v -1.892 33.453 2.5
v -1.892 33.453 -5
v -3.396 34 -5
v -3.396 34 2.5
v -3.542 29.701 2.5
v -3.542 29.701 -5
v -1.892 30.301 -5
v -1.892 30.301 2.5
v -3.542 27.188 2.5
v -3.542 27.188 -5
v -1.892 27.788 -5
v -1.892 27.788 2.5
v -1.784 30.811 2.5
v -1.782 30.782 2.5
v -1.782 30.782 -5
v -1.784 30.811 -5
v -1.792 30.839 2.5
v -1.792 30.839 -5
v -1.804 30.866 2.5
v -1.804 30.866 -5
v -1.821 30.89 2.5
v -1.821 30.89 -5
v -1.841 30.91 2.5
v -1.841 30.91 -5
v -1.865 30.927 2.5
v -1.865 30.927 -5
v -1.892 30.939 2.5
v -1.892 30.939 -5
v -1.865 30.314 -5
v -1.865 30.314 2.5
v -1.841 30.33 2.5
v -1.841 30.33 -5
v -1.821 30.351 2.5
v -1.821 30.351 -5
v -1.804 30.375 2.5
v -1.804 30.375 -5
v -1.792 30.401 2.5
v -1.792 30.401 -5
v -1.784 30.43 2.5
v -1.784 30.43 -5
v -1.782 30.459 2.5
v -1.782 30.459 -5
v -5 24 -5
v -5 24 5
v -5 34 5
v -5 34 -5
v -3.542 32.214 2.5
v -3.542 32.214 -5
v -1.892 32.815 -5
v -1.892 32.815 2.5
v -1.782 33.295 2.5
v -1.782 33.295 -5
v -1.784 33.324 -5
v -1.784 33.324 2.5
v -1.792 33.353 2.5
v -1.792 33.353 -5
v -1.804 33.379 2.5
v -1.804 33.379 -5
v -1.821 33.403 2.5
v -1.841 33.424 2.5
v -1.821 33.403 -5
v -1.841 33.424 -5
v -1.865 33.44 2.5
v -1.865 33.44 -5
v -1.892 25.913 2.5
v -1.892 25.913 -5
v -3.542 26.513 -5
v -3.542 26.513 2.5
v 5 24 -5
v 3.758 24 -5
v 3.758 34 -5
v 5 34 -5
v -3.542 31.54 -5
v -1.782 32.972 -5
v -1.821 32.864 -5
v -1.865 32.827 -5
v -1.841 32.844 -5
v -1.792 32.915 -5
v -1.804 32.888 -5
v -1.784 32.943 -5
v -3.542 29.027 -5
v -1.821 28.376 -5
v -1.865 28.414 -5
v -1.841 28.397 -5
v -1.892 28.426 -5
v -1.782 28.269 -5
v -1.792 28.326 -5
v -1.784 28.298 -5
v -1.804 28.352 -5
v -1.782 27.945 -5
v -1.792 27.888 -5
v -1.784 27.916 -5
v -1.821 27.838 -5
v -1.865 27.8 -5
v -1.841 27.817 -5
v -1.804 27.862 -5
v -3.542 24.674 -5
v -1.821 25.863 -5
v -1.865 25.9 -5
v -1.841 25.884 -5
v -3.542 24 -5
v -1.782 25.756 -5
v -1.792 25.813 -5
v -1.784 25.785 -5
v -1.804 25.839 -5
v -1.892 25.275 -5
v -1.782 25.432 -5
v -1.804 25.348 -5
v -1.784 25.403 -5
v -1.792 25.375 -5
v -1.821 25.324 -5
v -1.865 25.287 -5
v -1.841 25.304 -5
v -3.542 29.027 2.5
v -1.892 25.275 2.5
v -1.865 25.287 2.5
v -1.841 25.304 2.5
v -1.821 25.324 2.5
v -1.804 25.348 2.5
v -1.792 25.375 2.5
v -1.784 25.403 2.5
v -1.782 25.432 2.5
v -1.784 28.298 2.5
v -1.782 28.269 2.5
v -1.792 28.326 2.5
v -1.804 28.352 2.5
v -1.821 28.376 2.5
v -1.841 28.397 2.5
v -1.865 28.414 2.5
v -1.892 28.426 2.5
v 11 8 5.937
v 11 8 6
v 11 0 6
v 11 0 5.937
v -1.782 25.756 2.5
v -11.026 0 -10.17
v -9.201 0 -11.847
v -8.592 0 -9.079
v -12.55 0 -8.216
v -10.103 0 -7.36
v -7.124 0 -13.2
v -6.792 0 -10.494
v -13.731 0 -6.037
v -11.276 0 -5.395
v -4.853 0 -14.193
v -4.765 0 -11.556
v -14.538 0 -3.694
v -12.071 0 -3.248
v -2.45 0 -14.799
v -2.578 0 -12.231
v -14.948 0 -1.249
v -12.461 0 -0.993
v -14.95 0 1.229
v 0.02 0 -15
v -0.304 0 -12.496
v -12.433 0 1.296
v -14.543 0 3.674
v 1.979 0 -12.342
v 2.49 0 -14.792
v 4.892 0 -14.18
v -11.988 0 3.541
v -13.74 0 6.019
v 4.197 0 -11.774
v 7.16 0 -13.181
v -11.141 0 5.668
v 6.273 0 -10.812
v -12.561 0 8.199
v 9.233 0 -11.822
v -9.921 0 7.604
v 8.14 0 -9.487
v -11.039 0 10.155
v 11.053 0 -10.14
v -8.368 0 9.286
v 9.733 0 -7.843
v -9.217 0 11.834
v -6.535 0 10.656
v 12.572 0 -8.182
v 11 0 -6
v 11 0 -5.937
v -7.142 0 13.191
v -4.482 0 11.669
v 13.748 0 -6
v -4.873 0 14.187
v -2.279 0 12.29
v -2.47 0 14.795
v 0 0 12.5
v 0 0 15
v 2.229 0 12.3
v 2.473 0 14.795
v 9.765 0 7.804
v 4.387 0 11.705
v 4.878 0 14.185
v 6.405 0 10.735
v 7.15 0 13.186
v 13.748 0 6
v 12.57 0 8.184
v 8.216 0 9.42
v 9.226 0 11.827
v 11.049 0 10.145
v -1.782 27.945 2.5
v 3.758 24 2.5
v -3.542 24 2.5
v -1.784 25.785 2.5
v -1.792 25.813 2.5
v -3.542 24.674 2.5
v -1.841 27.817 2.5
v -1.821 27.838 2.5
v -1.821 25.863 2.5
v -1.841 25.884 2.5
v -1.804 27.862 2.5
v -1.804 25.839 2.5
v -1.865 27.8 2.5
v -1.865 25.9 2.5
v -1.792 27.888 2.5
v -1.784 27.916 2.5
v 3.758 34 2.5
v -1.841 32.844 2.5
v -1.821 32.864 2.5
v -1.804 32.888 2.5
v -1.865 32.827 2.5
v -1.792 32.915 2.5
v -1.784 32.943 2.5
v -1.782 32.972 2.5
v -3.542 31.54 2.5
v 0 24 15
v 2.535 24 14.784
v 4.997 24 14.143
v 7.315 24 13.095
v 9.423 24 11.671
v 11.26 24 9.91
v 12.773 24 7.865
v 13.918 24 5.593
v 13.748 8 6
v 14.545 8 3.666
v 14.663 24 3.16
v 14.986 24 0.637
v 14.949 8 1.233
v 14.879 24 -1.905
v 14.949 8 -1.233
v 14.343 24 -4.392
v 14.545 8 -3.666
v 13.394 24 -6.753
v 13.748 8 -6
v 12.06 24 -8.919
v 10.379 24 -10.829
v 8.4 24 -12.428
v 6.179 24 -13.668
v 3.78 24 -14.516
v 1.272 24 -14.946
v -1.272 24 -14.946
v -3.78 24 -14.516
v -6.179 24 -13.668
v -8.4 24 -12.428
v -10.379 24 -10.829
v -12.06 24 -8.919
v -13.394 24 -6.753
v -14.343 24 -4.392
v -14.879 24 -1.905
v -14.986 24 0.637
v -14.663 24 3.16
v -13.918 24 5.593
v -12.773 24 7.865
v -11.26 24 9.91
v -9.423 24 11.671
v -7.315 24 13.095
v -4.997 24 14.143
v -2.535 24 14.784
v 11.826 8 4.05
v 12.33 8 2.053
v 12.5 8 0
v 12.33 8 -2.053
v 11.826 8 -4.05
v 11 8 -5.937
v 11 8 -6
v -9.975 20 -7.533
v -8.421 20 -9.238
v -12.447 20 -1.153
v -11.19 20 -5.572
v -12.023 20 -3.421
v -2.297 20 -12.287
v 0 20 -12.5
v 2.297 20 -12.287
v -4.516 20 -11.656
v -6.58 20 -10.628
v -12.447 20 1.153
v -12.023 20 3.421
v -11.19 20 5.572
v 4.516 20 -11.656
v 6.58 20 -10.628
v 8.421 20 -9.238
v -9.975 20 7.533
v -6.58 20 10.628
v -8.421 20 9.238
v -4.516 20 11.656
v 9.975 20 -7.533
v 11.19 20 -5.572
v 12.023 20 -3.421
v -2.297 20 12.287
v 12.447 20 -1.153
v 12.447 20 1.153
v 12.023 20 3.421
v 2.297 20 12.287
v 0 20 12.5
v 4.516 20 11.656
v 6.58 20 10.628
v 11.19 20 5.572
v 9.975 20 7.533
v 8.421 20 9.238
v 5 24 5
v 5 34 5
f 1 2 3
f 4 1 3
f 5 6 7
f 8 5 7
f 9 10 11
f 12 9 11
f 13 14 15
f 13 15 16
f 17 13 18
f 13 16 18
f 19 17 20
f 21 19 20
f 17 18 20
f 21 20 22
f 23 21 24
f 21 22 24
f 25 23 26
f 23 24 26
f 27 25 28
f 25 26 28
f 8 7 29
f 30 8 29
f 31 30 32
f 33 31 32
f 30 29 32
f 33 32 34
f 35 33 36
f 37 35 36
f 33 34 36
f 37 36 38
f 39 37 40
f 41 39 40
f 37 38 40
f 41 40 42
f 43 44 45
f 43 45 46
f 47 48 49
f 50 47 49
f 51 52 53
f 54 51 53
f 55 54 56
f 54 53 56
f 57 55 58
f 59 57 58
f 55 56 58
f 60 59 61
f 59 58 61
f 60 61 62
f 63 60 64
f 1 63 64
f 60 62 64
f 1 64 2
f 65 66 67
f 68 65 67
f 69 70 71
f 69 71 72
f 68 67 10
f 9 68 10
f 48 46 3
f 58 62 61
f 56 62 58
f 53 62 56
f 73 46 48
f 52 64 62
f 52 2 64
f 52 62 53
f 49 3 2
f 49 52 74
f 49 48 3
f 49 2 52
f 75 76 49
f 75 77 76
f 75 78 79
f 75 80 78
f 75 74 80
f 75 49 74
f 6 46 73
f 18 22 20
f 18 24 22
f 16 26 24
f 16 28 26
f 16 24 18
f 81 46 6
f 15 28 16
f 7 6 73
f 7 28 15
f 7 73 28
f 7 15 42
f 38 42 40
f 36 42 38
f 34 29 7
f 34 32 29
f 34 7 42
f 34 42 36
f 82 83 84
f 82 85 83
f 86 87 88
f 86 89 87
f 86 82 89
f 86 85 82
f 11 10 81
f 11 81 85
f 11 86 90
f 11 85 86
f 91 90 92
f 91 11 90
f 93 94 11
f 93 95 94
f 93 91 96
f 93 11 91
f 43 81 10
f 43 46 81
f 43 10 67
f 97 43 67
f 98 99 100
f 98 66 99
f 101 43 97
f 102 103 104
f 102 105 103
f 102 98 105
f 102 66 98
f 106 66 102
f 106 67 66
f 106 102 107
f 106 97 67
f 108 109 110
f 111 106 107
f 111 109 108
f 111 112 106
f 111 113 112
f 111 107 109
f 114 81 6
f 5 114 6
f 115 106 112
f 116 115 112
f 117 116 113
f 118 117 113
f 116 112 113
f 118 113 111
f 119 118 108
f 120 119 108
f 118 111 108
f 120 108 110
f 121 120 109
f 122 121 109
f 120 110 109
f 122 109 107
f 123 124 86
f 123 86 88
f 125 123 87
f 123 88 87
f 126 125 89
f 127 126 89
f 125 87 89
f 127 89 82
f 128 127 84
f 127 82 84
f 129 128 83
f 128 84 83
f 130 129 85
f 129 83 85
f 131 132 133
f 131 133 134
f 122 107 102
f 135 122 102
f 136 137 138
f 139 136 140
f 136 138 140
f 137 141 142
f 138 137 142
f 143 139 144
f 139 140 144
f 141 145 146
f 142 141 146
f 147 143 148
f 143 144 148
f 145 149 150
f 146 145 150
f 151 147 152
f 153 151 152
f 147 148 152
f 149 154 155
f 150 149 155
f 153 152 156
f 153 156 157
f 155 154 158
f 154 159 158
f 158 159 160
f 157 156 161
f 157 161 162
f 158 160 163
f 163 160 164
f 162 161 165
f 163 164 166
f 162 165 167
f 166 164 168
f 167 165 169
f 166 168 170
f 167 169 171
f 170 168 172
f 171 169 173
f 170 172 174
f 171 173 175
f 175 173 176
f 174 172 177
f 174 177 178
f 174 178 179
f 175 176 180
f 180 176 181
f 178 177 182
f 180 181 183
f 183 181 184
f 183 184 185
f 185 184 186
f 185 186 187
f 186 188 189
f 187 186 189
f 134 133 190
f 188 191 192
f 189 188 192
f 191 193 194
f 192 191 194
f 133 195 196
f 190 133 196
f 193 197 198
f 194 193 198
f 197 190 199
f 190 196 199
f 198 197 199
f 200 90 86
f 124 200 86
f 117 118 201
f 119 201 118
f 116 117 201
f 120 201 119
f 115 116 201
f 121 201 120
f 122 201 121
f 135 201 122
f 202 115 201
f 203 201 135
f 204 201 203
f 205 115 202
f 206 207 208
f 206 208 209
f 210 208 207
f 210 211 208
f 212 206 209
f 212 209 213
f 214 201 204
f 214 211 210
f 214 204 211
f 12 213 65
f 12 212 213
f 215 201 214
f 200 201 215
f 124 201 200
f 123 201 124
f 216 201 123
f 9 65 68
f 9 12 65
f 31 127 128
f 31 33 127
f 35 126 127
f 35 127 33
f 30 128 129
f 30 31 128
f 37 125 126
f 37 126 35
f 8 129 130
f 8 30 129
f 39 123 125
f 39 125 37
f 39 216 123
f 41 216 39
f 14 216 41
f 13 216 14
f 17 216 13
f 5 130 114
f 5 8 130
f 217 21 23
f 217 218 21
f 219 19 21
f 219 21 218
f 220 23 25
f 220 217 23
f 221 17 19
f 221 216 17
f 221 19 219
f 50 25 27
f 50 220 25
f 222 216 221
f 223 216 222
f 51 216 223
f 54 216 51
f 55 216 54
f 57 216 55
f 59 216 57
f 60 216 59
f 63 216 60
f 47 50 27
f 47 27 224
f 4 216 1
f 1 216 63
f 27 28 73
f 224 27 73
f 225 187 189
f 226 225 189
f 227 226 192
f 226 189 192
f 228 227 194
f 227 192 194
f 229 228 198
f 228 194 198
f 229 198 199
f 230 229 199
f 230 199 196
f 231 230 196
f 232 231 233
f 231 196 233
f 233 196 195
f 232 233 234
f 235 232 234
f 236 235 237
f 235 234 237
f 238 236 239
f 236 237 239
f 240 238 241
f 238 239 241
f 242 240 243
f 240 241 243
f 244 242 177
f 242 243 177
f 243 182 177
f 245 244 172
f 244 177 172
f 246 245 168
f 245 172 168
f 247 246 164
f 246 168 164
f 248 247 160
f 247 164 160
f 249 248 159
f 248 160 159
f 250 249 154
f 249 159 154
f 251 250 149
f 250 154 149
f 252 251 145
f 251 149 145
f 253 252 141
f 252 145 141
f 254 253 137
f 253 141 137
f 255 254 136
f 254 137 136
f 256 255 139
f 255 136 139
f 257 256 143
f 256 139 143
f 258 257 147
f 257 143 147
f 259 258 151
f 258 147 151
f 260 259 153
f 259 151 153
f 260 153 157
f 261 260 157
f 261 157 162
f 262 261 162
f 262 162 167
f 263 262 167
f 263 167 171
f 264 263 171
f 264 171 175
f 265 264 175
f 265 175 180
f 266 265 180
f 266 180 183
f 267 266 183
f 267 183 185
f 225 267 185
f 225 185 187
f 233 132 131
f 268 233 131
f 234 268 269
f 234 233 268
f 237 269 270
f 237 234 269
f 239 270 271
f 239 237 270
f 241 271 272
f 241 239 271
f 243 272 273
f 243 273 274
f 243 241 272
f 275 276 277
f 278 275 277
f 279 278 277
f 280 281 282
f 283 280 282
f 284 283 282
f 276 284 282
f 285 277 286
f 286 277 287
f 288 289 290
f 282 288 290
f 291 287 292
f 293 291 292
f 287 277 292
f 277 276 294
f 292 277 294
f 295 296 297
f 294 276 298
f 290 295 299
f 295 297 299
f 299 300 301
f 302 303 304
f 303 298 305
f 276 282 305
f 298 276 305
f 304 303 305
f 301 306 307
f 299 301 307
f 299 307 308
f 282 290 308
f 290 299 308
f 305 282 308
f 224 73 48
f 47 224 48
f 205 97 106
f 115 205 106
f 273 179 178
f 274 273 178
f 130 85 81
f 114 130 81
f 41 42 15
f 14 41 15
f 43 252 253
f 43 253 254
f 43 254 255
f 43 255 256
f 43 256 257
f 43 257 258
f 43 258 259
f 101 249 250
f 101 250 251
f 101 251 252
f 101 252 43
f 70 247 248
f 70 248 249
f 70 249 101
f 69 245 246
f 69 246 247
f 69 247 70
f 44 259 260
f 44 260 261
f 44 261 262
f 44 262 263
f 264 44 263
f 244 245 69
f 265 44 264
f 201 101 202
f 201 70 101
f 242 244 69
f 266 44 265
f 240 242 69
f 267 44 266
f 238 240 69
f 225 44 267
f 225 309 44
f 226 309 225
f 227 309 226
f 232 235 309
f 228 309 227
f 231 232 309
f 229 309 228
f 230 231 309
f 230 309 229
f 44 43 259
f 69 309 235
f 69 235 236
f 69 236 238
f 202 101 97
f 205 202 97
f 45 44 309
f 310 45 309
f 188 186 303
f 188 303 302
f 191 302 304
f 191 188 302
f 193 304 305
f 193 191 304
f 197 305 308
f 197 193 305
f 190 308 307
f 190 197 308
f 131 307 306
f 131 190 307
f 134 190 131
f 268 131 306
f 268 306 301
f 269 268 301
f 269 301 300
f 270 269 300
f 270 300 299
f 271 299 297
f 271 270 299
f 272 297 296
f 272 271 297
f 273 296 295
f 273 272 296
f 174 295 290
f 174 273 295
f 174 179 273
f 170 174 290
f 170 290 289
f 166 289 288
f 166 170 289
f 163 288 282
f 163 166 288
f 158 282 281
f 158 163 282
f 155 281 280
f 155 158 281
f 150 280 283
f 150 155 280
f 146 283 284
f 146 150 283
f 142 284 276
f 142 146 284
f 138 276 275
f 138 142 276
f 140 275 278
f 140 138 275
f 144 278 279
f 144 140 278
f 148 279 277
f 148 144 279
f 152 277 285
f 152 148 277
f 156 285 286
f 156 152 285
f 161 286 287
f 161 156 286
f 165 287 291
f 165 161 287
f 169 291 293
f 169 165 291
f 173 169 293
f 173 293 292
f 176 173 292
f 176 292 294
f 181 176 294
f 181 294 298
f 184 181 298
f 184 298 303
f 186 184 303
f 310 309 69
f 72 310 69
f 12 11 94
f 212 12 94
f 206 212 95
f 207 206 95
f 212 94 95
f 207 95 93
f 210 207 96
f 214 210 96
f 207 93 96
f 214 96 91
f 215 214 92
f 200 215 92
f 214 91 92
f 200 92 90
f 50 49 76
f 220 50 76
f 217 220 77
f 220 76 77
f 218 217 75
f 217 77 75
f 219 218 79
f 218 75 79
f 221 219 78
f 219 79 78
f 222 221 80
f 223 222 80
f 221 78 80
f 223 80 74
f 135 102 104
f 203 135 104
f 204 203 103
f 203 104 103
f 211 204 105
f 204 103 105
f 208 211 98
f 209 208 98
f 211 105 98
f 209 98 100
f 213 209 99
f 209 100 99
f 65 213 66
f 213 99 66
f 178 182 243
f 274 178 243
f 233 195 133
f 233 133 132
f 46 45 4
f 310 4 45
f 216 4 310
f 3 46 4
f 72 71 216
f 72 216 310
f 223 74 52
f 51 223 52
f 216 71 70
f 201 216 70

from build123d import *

# Parameters (mm, degrees)
SKETCH1_R           = 15
SKETCH1_R_2         = 12.5
BOSS_EXTRUDE1_DEPTH = 20
SKETCH2_R           = 15
BOSS_EXTRUDE2_DEPTH = 4
SKETCH3_W           = 12
SKETCH3_H           = 8
CUT_EXTRUDE1_DEPTH  = 4
SKETCH4_W           = 10
SKETCH4_H           = 10
BOSS_EXTRUDE3_DEPTH = 10
CUT_EXTRUDE2_DEPTH  = 7.5


with BuildPart() as part:
    # Sketch1 → Boss-Extrude1 (new body)
    with BuildSketch(Plane(origin=(0, 0, 0), x_dir=(1, 0, 0), z_dir=(0, 1, 0))):
        with Locations(Location((0, 0, 0), (0, 0, 270))):
            Circle(SKETCH1_R)
        with Locations(Location((0, 0, 0), (0, 0, 270))):
            Circle(SKETCH1_R_2, mode=Mode.SUBTRACT)
    extrude(amount=BOSS_EXTRUDE1_DEPTH)

    # Sketch2 → Boss-Extrude2 (add)
    with BuildSketch(Plane(origin=(0, 20, 0), x_dir=(1, 0, 0), z_dir=(0, 1, 0))):
        with Locations(Location((0, 0, 0), (0, 0, 270))):
            Circle(SKETCH2_R)
    extrude(amount=BOSS_EXTRUDE2_DEPTH)

    # Sketch3 → Cut-Extrude1 (cut)
    with BuildSketch(Plane(origin=(15, 0, 0), x_dir=(0, 0, -1), z_dir=(1, 0, 0))):
        with Locations((0, 4)):
            Rectangle(SKETCH3_W, SKETCH3_H)
    extrude(amount=-CUT_EXTRUDE1_DEPTH, mode=Mode.SUBTRACT)

    # Sketch4 → Boss-Extrude3 (add)
    with BuildSketch(Plane(origin=(0, 24, 0), x_dir=(1, 0, 0), z_dir=(0, 1, 0))):
        Rectangle(SKETCH4_W, SKETCH4_H)
    extrude(amount=BOSS_EXTRUDE3_DEPTH)

    # Sketch6 → Cut-Extrude2 (cut)
    with BuildSketch(Plane(origin=(0, 0, -5), x_dir=(-1, 0, 0), z_dir=(0, 0, -1))):
        with BuildLine():
            Line((-1.758355149, 34), (-3.758355149, 34))
            Line((-3.758355149, 34), (-3.758355149, 24))
            Line((-3.758355149, 24), (3.541644851, 24))
            Line((3.541644851, 24), (3.541644851, 24.674283625))
            Line((3.541644851, 24.674283625), (1.891753796, 25.274794859))
            ThreePointArc((1.891753796, 25.274794859), (1.811908661, 25.336062186), (1.781644851, 25.432046729))
            Line((1.781644851, 25.432046729), (1.781644851, 25.755508896))
            ThreePointArc((1.781644851, 25.755508896), (1.811908661, 25.85149344), (1.891753796, 25.912760766))
            Line((1.891753796, 25.912760766), (3.541644851, 26.513272))
            Line((3.541644851, 26.513272), (3.541644851, 27.187555625))
            Line((3.541644851, 27.187555625), (1.891753796, 27.788066859))
            ThreePointArc((1.891753796, 27.788066859), (1.811908661, 27.849334186), (1.781644851, 27.945318729))
            Line((1.781644851, 27.945318729), (1.781644851, 28.268780896))
            ThreePointArc((1.781644851, 28.268780896), (1.811908661, 28.36476544), (1.891753796, 28.426032766))
            Line((1.891753796, 28.426032766), (3.541644851, 29.026544))
            Line((3.541644851, 29.026544), (3.541644851, 29.700827625))
            Line((3.541644851, 29.700827625), (1.891753796, 30.301338859))
            ThreePointArc((1.891753796, 30.301338859), (1.811908661, 30.362606186), (1.781644851, 30.458590729))
            Line((1.781644851, 30.458590729), (1.781644851, 30.782052896))
            ThreePointArc((1.781644851, 30.782052896), (1.811908661, 30.87803744), (1.891753796, 30.939304766))
            Line((1.891753796, 30.939304766), (3.541644851, 31.539816))
            Line((3.541644851, 31.539816), (3.541644851, 32.214099625))
            Line((3.541644851, 32.214099625), (1.891753796, 32.814610859))
            ThreePointArc((1.891753796, 32.814610859), (1.811908661, 32.875878186), (1.781644851, 32.971862729))
            Line((1.781644851, 32.971862729), (1.781644851, 33.295324896))
            ThreePointArc((1.781644851, 33.295324896), (1.811908661, 33.39130944), (1.891753796, 33.452576766))
            Line((1.891753796, 33.452576766), (3.39578677, 34))
            Line((3.39578677, 34), (0.241644851, 34))
            Line((0.241644851, 34), (-1.758355149, 34))
        make_face()
    extrude(amount=-CUT_EXTRUDE2_DEPTH, mode=Mode.SUBTRACT)


solid = part.part
